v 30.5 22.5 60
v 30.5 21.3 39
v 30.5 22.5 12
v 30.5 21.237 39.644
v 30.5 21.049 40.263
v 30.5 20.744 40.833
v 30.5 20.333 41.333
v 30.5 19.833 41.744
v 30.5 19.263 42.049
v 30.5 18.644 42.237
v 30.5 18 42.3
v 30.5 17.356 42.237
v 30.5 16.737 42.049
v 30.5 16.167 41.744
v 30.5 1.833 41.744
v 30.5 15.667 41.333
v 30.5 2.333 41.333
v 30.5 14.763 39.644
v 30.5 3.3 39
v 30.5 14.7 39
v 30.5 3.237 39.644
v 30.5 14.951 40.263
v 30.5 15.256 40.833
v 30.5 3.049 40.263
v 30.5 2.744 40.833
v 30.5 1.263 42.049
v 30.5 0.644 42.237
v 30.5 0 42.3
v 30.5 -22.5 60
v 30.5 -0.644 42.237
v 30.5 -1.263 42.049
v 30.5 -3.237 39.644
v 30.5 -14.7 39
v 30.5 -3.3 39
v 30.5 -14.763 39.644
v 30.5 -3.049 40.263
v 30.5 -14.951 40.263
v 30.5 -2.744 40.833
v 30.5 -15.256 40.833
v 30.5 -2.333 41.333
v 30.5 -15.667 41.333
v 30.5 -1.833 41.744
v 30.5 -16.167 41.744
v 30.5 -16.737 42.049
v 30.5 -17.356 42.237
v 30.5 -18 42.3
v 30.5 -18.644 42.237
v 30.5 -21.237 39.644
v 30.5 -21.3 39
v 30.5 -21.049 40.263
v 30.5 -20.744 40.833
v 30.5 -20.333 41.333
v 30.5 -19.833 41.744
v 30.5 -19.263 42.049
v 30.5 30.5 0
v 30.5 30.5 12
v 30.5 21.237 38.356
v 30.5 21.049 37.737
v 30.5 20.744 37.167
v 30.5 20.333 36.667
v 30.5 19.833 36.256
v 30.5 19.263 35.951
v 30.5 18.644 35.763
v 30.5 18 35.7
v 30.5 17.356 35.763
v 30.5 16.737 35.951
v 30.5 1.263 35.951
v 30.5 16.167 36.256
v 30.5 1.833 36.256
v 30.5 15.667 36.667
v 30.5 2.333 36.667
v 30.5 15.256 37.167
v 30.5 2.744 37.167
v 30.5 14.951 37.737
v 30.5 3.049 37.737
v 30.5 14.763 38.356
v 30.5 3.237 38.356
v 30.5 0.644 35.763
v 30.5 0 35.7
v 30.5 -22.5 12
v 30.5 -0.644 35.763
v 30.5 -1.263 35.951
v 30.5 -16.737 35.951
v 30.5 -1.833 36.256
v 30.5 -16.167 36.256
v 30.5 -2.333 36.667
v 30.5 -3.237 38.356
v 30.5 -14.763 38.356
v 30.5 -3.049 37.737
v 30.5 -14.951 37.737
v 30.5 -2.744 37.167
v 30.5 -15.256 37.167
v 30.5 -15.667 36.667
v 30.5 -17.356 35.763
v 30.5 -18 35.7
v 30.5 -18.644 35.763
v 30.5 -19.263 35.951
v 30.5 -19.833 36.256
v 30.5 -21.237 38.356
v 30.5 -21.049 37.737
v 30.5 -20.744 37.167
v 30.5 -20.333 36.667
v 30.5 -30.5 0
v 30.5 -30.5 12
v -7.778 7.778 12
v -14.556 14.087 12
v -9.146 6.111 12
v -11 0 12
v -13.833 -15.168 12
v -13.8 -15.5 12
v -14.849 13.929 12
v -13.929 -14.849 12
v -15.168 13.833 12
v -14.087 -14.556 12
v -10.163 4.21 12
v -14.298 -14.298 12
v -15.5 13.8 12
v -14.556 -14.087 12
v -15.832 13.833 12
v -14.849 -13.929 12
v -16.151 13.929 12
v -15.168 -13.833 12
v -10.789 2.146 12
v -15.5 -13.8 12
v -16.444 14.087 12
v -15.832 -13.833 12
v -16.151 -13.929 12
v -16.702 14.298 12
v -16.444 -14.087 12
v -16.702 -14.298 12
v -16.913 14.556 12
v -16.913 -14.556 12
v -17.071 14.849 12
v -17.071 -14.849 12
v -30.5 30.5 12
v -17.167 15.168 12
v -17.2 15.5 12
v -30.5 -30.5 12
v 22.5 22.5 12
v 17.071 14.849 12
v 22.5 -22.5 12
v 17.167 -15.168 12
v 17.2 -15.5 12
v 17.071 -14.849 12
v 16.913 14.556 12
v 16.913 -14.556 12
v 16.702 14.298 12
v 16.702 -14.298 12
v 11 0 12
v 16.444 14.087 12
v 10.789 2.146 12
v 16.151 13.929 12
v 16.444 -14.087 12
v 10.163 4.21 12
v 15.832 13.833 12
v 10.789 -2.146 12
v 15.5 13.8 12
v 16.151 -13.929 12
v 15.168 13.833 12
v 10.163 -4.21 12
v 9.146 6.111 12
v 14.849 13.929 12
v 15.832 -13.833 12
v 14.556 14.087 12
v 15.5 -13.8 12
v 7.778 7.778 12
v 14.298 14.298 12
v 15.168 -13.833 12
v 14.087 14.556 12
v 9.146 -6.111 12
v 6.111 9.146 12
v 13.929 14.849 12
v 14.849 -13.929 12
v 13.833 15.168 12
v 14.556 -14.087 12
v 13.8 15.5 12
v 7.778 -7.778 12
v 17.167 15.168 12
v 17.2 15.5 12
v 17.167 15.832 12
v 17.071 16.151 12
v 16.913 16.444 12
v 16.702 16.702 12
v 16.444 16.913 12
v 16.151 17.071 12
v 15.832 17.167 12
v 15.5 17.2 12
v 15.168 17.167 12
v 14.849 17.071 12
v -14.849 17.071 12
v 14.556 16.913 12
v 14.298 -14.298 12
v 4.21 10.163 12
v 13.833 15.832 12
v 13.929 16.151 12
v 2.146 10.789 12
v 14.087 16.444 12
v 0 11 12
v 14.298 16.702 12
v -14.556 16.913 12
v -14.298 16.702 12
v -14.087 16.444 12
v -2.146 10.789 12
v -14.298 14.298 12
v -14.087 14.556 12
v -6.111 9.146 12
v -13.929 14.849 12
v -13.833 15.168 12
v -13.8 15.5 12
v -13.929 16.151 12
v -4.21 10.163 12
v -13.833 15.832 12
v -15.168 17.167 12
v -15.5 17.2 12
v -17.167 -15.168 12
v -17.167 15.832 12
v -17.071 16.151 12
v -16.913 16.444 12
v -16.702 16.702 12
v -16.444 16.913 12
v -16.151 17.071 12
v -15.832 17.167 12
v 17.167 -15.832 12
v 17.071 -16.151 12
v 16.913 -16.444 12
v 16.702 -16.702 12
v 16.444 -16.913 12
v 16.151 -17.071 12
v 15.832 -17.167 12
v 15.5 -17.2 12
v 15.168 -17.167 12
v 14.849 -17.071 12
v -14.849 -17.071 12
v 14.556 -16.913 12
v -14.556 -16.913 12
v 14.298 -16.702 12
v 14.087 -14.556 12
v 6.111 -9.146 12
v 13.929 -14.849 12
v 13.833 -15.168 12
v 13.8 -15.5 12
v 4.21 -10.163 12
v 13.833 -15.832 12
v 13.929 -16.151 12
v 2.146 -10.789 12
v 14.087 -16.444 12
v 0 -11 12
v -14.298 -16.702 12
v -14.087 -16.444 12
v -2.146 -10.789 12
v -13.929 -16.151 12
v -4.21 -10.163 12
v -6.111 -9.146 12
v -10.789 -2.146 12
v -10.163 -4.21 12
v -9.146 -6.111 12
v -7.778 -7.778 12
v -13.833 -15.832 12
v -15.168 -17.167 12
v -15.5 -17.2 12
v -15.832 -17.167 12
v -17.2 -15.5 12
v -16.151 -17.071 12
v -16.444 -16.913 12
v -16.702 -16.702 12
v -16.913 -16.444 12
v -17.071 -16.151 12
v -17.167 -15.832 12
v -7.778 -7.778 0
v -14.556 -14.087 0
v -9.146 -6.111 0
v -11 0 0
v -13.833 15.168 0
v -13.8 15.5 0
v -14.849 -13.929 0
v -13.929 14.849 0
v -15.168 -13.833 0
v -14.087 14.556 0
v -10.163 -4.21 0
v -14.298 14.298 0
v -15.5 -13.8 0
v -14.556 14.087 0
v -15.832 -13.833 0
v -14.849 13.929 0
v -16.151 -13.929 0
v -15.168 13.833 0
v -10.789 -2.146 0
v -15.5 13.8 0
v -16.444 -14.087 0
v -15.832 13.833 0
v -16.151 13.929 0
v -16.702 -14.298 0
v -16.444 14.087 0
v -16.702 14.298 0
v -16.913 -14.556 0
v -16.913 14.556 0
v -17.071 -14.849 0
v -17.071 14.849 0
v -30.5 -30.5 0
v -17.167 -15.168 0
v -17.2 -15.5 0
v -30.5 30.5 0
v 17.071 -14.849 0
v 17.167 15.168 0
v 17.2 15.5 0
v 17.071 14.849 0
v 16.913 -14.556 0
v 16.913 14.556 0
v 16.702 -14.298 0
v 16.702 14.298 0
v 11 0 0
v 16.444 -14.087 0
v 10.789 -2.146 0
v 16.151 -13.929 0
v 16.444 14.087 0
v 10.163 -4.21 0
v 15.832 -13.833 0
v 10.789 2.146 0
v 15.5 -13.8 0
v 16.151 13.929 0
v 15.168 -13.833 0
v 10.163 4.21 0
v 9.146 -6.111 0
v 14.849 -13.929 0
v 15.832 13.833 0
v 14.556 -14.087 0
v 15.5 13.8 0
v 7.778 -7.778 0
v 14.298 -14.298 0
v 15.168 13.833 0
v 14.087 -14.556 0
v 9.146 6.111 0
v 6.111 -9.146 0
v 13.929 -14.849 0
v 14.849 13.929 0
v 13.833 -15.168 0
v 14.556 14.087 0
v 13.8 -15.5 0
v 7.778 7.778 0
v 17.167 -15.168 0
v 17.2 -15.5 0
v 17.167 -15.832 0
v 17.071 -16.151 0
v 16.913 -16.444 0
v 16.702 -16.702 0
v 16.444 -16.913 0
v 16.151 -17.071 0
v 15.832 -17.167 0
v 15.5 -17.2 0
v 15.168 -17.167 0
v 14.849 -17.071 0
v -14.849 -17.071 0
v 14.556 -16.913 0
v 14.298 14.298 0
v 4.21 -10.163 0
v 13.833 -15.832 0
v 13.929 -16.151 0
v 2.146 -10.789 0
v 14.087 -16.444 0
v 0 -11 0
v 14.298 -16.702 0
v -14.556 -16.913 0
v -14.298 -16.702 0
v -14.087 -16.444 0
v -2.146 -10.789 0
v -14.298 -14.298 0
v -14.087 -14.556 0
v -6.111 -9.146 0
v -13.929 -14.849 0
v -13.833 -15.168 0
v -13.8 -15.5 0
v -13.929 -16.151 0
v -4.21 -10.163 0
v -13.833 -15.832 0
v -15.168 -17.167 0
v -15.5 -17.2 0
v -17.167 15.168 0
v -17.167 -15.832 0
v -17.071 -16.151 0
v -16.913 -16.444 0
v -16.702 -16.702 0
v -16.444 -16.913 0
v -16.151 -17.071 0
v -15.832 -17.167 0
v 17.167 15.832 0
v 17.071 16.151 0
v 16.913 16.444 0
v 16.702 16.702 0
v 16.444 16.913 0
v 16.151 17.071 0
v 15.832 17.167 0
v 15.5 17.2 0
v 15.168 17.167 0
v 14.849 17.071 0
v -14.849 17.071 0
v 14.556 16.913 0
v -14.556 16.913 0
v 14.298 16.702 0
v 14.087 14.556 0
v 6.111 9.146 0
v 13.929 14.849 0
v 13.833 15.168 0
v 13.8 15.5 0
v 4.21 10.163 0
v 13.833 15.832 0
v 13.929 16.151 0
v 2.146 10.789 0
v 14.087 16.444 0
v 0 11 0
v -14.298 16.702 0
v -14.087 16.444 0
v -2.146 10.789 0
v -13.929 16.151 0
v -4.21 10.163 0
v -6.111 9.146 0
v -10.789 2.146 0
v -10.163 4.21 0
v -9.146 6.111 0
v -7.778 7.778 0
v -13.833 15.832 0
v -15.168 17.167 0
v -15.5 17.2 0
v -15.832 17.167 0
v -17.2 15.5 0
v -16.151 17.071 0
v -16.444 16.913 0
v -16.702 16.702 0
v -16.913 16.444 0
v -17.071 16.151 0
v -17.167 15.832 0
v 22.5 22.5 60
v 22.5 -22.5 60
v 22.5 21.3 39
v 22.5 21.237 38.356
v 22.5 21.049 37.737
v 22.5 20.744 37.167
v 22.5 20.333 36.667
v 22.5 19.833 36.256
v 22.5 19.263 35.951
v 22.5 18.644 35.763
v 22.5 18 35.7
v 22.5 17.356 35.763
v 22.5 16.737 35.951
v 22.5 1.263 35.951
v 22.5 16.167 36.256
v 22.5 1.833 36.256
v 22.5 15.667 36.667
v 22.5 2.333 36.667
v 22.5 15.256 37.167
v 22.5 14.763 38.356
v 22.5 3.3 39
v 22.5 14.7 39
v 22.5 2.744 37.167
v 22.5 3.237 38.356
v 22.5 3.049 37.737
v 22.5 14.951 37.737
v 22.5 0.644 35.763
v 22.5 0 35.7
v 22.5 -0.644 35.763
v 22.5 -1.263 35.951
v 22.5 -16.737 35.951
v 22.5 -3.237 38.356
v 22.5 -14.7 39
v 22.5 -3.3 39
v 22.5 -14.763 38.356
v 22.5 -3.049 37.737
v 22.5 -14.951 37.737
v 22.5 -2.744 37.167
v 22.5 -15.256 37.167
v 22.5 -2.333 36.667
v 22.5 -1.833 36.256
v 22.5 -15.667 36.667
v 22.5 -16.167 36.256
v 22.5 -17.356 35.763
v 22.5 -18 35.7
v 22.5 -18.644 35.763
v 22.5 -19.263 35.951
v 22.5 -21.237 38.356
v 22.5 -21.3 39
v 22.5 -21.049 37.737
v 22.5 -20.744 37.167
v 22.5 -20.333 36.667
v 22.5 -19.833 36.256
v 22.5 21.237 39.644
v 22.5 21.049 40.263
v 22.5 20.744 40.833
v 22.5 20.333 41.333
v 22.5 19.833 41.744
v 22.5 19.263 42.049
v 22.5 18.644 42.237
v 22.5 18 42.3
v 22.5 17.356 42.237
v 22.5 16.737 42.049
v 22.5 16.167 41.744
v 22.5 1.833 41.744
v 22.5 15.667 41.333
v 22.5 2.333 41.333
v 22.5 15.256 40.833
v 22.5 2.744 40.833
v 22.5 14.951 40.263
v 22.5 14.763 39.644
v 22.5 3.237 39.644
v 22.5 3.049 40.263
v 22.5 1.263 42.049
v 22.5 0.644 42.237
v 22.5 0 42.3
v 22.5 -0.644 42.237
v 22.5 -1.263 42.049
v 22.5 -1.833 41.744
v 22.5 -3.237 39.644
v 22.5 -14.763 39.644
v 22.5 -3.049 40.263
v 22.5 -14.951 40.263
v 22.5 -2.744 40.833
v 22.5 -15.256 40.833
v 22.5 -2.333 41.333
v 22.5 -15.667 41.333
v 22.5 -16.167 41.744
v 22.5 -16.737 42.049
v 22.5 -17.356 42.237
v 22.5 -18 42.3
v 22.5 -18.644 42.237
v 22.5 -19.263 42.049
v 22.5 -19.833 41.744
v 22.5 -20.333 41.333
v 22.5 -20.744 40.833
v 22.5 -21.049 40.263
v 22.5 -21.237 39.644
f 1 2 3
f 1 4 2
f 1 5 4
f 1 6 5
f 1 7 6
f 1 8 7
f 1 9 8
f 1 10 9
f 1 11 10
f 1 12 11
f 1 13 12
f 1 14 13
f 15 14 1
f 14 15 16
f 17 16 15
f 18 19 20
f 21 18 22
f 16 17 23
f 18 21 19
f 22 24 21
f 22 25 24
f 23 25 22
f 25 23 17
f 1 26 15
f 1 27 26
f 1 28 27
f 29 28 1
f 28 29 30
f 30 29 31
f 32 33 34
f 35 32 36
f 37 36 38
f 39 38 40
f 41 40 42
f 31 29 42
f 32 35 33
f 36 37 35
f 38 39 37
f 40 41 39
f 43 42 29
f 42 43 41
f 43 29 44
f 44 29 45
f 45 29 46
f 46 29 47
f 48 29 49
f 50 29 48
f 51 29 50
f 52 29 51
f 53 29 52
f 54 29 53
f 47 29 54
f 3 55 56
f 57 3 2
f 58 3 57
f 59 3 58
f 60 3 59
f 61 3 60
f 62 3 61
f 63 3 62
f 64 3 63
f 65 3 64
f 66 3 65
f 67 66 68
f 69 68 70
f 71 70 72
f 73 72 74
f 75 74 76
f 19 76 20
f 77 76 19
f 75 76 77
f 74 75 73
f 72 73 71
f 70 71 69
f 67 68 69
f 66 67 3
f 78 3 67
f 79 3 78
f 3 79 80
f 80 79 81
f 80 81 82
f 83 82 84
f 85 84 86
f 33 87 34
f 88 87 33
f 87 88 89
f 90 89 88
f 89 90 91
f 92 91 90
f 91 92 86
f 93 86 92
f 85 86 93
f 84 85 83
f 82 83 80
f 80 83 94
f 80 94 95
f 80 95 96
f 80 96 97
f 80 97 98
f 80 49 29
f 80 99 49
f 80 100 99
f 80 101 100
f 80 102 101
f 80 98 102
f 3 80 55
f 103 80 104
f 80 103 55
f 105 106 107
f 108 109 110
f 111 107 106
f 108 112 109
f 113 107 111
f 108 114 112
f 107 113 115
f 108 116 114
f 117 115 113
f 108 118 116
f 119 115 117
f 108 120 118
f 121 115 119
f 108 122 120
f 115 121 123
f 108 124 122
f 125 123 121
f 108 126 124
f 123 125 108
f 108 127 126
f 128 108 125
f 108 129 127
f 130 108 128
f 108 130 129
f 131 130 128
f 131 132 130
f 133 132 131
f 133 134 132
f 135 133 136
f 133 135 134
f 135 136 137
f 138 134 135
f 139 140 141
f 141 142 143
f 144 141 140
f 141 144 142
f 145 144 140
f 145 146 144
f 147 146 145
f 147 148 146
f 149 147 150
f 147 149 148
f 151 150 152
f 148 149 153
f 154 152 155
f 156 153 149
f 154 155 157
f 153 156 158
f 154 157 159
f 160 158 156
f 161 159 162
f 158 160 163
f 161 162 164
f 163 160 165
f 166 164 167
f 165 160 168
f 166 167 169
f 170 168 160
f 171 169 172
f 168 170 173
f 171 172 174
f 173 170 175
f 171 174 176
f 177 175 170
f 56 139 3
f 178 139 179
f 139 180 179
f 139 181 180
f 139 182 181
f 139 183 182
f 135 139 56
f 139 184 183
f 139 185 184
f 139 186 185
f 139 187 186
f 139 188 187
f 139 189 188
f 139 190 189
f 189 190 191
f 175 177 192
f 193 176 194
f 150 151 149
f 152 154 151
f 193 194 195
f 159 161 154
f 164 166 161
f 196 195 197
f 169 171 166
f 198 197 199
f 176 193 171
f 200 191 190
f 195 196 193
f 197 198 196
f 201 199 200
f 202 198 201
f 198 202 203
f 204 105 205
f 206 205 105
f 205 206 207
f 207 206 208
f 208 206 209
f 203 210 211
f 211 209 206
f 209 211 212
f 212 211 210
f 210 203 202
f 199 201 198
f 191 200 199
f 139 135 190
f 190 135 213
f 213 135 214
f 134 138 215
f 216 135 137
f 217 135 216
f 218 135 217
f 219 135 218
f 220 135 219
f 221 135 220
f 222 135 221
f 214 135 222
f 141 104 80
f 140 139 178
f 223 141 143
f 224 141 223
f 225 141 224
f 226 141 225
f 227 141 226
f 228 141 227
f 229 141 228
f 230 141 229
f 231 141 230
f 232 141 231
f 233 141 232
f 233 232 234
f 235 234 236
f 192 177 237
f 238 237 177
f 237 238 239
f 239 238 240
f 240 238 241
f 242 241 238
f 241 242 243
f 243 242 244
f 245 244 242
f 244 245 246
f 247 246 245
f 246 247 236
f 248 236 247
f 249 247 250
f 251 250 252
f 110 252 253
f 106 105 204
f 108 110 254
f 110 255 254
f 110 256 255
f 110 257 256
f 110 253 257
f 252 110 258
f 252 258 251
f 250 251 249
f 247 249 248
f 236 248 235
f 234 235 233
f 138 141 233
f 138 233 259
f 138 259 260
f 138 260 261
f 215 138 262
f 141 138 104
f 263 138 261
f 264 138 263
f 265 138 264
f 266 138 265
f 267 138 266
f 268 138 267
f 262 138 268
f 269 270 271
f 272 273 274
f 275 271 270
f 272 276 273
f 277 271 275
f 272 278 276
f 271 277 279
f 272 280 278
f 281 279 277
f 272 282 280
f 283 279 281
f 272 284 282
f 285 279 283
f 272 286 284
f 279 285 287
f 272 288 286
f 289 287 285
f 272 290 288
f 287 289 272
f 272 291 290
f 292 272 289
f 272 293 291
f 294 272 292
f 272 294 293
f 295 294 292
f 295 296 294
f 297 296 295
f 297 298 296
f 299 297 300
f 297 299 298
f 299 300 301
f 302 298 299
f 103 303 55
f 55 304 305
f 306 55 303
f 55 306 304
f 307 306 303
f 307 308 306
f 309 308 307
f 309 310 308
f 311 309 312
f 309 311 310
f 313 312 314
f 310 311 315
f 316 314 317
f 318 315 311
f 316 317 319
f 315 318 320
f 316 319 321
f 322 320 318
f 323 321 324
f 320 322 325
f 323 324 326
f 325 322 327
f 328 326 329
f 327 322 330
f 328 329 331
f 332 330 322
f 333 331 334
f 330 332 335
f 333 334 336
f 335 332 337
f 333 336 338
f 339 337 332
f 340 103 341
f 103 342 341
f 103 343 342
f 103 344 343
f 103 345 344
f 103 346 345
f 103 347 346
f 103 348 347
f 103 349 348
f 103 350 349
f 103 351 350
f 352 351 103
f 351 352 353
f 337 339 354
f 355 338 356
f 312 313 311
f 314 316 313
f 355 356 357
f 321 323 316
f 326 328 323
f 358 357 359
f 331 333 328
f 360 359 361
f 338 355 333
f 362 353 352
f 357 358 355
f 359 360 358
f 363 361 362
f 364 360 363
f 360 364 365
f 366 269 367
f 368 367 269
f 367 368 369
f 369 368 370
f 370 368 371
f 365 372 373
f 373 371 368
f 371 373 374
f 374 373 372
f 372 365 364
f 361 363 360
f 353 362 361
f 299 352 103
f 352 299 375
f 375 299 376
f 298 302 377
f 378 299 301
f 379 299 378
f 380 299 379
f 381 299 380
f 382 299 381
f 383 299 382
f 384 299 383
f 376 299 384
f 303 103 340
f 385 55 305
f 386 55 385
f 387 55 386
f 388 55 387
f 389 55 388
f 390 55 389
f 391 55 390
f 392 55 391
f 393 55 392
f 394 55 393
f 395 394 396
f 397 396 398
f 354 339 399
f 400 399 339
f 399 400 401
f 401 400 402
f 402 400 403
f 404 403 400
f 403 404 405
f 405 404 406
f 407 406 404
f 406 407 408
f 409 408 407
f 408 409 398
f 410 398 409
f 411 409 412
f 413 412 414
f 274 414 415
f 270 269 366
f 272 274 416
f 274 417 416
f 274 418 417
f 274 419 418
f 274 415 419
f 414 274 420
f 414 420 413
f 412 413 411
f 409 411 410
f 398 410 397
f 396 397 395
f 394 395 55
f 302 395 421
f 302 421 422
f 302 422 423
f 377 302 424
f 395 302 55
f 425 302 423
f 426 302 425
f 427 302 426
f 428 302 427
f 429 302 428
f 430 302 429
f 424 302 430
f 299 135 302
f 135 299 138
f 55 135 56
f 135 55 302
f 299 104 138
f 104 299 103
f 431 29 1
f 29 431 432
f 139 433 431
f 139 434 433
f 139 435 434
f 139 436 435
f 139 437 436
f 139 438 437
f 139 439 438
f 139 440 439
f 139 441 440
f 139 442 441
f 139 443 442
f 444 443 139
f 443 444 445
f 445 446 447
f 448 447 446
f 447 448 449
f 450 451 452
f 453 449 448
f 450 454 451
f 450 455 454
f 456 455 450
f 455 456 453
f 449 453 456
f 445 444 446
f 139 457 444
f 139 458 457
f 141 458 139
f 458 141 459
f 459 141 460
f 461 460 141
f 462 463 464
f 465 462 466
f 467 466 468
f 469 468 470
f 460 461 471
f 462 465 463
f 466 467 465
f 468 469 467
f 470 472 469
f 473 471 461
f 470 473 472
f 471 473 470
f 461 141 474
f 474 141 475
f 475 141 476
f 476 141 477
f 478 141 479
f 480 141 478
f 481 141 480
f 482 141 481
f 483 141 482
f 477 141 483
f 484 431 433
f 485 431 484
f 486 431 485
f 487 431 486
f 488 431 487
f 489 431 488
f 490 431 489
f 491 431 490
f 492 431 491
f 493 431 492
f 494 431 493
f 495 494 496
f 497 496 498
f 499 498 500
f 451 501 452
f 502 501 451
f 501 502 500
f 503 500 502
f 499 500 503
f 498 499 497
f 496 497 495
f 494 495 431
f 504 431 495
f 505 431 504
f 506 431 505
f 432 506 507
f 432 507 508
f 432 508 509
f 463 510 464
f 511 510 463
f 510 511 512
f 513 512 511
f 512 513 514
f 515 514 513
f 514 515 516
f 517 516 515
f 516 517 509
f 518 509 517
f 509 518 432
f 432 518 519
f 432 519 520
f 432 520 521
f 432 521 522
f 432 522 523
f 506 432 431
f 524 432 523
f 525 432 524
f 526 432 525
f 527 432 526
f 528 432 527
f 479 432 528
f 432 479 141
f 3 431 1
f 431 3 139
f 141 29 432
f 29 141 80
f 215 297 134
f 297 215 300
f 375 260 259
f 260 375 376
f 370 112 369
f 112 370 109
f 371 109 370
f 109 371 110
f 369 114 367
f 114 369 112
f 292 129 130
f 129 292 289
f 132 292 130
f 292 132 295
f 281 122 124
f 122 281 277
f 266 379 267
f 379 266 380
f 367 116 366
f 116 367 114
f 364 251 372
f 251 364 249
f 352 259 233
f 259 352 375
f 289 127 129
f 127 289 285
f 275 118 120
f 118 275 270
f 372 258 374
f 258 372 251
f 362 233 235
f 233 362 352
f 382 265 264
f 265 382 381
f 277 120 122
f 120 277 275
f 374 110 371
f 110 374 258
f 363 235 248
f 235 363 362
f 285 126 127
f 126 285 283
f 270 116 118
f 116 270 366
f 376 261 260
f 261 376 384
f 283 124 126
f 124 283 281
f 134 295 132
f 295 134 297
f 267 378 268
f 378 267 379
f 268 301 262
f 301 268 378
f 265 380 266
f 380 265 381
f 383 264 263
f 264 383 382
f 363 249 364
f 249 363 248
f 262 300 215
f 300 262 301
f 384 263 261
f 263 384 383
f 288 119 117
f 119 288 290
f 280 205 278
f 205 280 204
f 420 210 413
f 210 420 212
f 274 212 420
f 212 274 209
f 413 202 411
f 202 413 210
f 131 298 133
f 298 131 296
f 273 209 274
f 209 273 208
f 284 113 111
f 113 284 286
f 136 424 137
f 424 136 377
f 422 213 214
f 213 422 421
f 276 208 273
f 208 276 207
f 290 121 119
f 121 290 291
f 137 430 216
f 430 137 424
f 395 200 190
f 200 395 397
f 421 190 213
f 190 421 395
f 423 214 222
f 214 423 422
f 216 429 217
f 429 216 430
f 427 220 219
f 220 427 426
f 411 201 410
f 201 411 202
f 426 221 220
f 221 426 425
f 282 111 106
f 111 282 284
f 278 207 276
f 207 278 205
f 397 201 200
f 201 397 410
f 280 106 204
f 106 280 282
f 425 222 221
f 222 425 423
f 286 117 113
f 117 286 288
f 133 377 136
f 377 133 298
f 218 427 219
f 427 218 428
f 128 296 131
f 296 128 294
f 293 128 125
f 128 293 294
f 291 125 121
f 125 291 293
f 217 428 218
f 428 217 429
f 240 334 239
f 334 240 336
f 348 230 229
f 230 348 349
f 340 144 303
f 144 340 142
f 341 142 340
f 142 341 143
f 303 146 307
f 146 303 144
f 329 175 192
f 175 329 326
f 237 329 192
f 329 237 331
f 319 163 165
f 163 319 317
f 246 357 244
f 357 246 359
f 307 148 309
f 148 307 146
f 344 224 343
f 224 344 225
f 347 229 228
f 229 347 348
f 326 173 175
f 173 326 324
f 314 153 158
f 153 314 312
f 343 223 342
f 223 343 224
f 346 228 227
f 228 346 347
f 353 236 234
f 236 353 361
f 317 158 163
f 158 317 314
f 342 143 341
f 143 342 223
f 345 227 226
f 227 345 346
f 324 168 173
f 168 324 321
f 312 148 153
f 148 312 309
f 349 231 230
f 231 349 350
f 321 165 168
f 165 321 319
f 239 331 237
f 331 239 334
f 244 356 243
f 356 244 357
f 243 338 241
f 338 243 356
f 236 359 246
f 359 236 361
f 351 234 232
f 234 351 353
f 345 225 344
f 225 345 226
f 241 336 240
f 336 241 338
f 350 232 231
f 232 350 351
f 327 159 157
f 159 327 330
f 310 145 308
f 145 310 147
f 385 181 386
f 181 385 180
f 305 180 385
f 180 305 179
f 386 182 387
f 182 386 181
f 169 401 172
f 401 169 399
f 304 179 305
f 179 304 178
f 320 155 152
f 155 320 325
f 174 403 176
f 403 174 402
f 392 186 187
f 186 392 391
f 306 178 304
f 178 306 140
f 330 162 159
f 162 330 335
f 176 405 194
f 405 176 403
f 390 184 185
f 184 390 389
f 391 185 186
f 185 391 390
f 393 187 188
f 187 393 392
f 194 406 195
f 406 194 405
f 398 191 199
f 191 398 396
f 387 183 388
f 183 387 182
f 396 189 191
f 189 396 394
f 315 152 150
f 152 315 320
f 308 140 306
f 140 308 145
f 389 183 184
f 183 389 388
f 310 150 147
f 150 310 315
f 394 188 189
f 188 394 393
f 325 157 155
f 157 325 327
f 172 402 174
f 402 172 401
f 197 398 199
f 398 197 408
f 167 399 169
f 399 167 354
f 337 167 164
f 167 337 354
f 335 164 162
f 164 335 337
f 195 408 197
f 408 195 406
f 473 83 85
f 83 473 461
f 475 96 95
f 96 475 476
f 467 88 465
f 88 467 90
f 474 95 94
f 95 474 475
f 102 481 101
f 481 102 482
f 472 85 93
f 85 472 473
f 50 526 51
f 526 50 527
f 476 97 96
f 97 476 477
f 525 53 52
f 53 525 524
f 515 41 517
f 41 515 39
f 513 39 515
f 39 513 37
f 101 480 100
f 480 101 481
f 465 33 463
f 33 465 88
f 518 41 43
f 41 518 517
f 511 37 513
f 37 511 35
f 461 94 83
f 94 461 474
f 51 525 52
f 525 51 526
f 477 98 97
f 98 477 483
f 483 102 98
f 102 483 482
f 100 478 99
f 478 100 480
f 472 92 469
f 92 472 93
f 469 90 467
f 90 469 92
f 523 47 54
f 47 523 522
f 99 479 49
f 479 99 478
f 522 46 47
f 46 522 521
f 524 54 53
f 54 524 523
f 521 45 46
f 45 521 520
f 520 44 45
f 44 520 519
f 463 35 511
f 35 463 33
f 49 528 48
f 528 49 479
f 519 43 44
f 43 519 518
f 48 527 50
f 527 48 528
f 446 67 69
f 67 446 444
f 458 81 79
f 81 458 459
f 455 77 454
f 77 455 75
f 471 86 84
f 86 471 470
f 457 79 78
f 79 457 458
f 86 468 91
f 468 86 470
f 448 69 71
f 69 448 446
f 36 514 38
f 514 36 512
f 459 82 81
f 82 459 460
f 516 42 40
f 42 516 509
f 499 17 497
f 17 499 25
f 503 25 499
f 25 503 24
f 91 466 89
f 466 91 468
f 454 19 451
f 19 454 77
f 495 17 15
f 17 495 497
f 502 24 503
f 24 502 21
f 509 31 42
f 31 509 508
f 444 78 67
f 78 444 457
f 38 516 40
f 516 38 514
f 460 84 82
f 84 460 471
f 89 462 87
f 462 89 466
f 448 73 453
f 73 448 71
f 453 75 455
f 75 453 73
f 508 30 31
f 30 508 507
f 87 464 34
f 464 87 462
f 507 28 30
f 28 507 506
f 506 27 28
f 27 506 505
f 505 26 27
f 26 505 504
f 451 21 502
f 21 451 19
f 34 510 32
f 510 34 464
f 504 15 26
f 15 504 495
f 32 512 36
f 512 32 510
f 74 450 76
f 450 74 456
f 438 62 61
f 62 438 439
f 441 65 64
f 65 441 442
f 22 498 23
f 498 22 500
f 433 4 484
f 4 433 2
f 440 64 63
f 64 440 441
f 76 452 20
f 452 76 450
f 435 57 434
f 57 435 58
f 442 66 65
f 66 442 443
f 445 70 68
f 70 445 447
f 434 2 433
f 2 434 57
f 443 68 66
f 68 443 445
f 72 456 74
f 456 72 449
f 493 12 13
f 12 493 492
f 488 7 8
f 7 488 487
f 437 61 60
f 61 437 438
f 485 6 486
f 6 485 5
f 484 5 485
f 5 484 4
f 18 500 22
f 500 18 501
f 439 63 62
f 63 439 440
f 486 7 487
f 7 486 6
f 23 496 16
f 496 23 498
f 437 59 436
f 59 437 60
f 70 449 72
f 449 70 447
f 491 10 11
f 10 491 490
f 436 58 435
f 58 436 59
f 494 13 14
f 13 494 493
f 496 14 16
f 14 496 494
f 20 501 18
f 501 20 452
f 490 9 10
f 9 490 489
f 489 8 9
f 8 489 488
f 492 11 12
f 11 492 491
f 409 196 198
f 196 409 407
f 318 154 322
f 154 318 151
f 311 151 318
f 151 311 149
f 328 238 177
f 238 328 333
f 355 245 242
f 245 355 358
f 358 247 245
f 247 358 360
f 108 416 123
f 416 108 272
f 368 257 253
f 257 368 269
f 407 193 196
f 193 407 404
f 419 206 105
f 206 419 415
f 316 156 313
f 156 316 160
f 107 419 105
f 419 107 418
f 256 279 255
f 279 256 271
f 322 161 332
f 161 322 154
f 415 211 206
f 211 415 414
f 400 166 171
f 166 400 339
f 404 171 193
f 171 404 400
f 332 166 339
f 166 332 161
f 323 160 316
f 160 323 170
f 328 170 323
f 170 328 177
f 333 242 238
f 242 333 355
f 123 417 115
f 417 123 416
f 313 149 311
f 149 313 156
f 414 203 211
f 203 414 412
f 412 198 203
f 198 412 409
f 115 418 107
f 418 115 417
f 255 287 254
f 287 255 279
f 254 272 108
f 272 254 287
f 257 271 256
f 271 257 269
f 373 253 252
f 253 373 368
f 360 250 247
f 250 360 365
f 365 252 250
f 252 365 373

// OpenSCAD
$fn = 32;

// ----------------------------------------------------------------------
// Motor mount plate: NEMA17, 61 x 61 x 72 mm
// ----------------------------------------------------------------------

// --- parameters (mm) ---
base_x = 61;              // plate length, X
base_y = 61;              // plate width, Y
thick = 12;               // plate thickness
bolt_pitch = 31;          // NEMA17 bolt spacing
motor_d = 3.4;            // NEMA17 screw clearance
boss_hole = 22;           // pilot boss bore
second_d = 6.6;           // second fastener hole
wall_h = 60;              // upright height
wall_t = 8;               // upright thickness

module plate() {
  translate([-base_x / 2, -base_y / 2, 0]) cube([base_x, base_y, thick]);
}

module motor_holes() {
  for (sx = [-1, 1]) for (sy = [-1, 1])
    translate([sx * bolt_pitch / 2, sy * bolt_pitch / 2, -1])
      cylinder(h = thick + 2, d = motor_d);
}
module upright() {
  /* wall sunk 1 mm into the plate for a positive overlap */
  translate([base_x / 2 - wall_t, -base_y / 2 + wall_t, thick - 1])
    cube([wall_t, base_y - 2 * wall_t, wall_h - thick + 1]);
}

difference() {
  union() {
    plate();
    upright();
  }
  motor_holes();
  translate([0, 0, -1]) cylinder(h = thick + 2, d = boss_hole);
  for (i = [0 : 2])
    translate([base_x / 2 - wall_t - 1, (i - 1) * wall_h * 0.3, thick + wall_h * 0.45]) rotate([0, 90, 0]) cylinder(h = wall_t + 2, d = second_d);
}
